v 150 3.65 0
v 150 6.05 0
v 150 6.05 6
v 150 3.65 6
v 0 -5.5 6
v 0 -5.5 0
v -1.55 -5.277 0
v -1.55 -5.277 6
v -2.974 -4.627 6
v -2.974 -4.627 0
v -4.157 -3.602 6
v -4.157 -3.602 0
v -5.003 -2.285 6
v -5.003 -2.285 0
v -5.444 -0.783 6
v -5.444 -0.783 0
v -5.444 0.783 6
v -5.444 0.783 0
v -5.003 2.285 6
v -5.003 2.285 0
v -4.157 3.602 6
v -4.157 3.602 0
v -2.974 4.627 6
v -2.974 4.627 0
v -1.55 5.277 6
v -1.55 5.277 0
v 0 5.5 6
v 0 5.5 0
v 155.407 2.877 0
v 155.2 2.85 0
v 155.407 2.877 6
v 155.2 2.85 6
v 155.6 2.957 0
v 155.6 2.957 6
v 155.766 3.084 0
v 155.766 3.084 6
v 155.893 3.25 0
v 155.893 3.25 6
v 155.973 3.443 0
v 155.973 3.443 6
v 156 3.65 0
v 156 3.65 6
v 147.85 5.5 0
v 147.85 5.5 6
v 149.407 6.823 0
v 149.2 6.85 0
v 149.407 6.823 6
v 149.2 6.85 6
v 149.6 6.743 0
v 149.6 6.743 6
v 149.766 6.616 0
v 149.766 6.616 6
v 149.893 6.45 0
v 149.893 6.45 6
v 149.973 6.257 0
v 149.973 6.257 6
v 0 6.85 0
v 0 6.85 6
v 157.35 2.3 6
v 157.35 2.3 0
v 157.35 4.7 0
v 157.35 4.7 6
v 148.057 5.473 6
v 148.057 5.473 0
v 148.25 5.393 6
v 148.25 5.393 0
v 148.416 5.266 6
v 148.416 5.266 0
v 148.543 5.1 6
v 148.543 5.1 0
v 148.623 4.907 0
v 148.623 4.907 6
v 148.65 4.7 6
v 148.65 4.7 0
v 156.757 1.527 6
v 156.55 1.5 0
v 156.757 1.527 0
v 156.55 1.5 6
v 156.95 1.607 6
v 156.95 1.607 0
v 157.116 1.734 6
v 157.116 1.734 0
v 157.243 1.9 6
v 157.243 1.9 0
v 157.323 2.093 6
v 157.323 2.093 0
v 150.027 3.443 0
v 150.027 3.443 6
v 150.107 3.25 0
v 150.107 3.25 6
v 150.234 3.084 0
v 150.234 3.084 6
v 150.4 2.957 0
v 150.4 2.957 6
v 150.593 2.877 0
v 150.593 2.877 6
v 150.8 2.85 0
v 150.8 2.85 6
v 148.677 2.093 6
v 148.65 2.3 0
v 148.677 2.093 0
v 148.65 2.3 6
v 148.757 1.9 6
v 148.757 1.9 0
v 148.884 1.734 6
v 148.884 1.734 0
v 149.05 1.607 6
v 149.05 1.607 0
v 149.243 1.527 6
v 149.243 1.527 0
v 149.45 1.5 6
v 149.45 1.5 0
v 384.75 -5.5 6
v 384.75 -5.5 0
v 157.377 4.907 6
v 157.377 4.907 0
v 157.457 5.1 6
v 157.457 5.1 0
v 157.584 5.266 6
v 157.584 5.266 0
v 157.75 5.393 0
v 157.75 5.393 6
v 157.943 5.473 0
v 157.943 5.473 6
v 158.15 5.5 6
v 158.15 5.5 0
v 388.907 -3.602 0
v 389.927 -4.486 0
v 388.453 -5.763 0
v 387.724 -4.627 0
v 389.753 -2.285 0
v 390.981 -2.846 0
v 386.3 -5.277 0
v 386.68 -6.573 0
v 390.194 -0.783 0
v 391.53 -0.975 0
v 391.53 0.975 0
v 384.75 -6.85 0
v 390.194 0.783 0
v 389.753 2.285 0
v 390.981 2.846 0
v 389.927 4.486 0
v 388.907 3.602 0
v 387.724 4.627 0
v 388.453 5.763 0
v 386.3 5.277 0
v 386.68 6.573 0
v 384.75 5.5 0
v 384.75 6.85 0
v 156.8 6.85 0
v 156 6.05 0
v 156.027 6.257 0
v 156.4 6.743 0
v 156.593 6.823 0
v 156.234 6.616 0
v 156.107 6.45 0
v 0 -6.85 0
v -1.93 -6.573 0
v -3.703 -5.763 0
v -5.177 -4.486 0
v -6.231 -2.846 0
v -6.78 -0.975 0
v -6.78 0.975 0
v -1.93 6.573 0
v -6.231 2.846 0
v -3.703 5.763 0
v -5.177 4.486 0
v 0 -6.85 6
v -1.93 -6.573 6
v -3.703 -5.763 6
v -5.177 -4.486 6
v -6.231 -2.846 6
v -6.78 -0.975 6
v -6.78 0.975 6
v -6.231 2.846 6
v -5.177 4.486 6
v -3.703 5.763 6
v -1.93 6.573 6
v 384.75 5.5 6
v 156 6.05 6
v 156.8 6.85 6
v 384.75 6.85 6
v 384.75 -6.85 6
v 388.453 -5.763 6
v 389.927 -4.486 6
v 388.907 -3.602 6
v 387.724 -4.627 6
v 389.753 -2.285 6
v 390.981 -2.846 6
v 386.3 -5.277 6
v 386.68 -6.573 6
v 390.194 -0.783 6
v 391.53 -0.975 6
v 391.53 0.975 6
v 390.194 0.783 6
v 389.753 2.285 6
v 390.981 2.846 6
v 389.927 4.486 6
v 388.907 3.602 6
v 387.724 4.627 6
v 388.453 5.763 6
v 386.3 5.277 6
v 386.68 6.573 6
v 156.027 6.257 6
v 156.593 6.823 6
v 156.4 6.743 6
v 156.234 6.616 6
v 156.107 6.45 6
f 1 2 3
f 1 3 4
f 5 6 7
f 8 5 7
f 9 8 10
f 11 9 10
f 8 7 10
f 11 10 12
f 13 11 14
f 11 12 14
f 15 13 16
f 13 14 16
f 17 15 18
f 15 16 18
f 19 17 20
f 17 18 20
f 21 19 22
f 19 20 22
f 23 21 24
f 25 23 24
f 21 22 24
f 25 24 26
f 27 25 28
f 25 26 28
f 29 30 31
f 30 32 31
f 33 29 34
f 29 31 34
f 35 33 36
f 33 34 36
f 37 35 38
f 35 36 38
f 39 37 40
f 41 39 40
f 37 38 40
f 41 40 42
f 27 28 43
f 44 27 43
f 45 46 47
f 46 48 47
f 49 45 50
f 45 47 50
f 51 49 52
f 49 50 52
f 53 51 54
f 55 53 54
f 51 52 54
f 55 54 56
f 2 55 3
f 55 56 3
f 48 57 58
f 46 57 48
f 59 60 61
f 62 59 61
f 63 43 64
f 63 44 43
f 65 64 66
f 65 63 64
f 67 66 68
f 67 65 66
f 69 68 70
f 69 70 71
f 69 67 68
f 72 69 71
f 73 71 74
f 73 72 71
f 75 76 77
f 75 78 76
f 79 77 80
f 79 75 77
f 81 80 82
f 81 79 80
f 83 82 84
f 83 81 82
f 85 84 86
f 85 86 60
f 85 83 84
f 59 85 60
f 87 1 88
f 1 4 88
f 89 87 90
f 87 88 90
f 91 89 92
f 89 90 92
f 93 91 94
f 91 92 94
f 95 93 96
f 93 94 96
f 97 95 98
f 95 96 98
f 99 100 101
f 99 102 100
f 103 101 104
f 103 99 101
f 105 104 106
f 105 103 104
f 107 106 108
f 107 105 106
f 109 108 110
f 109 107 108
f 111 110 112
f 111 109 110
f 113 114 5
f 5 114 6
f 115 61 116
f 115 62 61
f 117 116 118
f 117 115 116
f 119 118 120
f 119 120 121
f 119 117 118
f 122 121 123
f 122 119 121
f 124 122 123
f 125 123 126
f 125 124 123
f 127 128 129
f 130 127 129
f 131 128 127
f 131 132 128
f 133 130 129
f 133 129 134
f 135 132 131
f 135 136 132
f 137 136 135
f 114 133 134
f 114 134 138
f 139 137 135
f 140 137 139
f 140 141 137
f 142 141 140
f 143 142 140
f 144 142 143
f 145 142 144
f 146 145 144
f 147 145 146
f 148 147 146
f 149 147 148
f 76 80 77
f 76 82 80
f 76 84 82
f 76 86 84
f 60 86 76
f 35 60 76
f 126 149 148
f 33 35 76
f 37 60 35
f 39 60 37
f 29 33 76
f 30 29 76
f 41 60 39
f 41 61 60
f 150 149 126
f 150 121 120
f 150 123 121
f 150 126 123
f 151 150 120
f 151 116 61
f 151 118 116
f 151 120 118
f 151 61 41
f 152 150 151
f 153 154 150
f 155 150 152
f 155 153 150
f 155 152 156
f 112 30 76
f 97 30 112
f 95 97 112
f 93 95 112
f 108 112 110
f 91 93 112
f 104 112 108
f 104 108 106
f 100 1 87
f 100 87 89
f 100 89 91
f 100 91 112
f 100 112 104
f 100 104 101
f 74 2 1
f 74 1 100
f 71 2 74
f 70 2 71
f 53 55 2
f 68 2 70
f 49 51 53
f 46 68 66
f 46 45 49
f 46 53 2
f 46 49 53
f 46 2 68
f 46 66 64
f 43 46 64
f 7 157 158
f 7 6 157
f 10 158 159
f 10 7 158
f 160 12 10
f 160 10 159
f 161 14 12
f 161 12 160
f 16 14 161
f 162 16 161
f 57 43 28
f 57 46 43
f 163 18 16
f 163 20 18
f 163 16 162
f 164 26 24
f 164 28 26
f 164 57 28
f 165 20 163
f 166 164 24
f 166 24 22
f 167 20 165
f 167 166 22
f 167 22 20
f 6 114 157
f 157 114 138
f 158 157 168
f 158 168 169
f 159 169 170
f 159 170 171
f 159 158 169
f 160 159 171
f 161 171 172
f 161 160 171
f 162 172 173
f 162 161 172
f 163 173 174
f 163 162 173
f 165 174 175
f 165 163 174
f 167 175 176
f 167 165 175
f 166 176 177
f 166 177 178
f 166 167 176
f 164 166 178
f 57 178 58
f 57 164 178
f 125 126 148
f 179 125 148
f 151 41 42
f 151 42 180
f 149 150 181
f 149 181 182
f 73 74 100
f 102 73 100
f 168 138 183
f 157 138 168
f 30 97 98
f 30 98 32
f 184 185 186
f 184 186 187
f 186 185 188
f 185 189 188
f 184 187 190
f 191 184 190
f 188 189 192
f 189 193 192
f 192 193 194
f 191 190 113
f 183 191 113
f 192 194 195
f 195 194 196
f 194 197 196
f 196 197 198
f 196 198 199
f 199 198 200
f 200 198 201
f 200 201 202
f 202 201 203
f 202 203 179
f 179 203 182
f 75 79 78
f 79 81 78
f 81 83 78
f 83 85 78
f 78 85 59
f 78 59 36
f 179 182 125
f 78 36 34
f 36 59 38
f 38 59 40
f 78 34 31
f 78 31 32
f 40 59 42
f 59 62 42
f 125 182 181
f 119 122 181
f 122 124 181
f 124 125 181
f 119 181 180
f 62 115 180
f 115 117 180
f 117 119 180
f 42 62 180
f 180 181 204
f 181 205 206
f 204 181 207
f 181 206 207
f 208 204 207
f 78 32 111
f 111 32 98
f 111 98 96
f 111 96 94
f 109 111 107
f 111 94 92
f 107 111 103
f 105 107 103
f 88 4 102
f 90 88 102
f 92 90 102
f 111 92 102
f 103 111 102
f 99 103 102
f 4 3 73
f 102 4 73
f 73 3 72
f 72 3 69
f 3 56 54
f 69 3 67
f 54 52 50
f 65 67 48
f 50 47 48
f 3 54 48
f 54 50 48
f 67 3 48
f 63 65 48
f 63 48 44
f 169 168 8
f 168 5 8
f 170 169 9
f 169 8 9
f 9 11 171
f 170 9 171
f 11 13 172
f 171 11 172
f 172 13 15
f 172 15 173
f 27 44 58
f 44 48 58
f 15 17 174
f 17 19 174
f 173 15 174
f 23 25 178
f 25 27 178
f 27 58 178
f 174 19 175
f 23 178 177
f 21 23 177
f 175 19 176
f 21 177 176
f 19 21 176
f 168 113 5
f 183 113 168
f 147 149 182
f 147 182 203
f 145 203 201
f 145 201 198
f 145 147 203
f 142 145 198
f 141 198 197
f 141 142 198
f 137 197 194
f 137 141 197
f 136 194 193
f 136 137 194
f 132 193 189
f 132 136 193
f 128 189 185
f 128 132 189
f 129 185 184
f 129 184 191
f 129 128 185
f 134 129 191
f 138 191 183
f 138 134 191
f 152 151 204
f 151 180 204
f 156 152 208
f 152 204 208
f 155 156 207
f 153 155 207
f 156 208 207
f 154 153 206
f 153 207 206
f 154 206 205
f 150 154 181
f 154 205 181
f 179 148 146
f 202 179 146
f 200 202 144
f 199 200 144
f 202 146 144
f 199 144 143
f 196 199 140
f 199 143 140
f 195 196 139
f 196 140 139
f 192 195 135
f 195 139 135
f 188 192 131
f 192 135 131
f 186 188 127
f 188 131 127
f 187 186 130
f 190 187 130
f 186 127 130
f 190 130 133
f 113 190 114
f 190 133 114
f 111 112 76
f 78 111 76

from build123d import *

# Parameters (mm, degrees)
SALIENTE_EXTRUIR1_DEPTH = 6
REDONDEO1_R             = 0.8


with BuildPart() as part:
    # Croquis1 → Saliente-Extruir1 (new body)
    with BuildSketch(Plane.XY):
        with BuildLine():
            Line((0, 6.85), (150, 6.85))
            Line((150, 6.85), (150, 2.85))
            Line((150, 2.85), (156, 2.85))
            Line((156, 2.85), (156, 6.85))
            Line((156, 6.85), (384.75, 6.85))
            ThreePointArc((384.75, 6.85), (391.6, 0), (384.75, -6.85))
            Line((384.75, -6.85), (0, -6.85))
            ThreePointArc((0, -6.85), (-6.85, 0), (0, 6.85))
        make_face()
        with BuildLine():
            Line((0, 5.5), (148.65, 5.5))
            Line((148.65, 5.5), (148.65, 1.5))
            Line((148.65, 1.5), (157.35, 1.5))
            Line((157.35, 1.5), (157.35, 5.5))
            Line((157.35, 5.5), (384.75, 5.5))
            ThreePointArc((384.75, 5.5), (390.25, 0), (384.75, -5.5))
            Line((384.75, -5.5), (0, -5.5))
            ThreePointArc((0, -5.5), (-5.5, 0), (0, 5.5))
        make_face(mode=Mode.SUBTRACT)
    extrude(amount=SALIENTE_EXTRUIR1_DEPTH)

    # Redondeo1
    redondeo1_edges = [part.edges().sort_by_distance(p)[0] for p in [
        (150, 6.85, 3),
        (150, 2.85, 3),
        (156, 2.85, 3),
        (156, 6.85, 3),
        (157.35, 5.5, 3),
        (157.35, 1.5, 3),
        (148.65, 1.5, 3),
        (148.65, 5.5, 3),
    ]]
    fillet(redondeo1_edges, radius=REDONDEO1_R)


solid = part.part
